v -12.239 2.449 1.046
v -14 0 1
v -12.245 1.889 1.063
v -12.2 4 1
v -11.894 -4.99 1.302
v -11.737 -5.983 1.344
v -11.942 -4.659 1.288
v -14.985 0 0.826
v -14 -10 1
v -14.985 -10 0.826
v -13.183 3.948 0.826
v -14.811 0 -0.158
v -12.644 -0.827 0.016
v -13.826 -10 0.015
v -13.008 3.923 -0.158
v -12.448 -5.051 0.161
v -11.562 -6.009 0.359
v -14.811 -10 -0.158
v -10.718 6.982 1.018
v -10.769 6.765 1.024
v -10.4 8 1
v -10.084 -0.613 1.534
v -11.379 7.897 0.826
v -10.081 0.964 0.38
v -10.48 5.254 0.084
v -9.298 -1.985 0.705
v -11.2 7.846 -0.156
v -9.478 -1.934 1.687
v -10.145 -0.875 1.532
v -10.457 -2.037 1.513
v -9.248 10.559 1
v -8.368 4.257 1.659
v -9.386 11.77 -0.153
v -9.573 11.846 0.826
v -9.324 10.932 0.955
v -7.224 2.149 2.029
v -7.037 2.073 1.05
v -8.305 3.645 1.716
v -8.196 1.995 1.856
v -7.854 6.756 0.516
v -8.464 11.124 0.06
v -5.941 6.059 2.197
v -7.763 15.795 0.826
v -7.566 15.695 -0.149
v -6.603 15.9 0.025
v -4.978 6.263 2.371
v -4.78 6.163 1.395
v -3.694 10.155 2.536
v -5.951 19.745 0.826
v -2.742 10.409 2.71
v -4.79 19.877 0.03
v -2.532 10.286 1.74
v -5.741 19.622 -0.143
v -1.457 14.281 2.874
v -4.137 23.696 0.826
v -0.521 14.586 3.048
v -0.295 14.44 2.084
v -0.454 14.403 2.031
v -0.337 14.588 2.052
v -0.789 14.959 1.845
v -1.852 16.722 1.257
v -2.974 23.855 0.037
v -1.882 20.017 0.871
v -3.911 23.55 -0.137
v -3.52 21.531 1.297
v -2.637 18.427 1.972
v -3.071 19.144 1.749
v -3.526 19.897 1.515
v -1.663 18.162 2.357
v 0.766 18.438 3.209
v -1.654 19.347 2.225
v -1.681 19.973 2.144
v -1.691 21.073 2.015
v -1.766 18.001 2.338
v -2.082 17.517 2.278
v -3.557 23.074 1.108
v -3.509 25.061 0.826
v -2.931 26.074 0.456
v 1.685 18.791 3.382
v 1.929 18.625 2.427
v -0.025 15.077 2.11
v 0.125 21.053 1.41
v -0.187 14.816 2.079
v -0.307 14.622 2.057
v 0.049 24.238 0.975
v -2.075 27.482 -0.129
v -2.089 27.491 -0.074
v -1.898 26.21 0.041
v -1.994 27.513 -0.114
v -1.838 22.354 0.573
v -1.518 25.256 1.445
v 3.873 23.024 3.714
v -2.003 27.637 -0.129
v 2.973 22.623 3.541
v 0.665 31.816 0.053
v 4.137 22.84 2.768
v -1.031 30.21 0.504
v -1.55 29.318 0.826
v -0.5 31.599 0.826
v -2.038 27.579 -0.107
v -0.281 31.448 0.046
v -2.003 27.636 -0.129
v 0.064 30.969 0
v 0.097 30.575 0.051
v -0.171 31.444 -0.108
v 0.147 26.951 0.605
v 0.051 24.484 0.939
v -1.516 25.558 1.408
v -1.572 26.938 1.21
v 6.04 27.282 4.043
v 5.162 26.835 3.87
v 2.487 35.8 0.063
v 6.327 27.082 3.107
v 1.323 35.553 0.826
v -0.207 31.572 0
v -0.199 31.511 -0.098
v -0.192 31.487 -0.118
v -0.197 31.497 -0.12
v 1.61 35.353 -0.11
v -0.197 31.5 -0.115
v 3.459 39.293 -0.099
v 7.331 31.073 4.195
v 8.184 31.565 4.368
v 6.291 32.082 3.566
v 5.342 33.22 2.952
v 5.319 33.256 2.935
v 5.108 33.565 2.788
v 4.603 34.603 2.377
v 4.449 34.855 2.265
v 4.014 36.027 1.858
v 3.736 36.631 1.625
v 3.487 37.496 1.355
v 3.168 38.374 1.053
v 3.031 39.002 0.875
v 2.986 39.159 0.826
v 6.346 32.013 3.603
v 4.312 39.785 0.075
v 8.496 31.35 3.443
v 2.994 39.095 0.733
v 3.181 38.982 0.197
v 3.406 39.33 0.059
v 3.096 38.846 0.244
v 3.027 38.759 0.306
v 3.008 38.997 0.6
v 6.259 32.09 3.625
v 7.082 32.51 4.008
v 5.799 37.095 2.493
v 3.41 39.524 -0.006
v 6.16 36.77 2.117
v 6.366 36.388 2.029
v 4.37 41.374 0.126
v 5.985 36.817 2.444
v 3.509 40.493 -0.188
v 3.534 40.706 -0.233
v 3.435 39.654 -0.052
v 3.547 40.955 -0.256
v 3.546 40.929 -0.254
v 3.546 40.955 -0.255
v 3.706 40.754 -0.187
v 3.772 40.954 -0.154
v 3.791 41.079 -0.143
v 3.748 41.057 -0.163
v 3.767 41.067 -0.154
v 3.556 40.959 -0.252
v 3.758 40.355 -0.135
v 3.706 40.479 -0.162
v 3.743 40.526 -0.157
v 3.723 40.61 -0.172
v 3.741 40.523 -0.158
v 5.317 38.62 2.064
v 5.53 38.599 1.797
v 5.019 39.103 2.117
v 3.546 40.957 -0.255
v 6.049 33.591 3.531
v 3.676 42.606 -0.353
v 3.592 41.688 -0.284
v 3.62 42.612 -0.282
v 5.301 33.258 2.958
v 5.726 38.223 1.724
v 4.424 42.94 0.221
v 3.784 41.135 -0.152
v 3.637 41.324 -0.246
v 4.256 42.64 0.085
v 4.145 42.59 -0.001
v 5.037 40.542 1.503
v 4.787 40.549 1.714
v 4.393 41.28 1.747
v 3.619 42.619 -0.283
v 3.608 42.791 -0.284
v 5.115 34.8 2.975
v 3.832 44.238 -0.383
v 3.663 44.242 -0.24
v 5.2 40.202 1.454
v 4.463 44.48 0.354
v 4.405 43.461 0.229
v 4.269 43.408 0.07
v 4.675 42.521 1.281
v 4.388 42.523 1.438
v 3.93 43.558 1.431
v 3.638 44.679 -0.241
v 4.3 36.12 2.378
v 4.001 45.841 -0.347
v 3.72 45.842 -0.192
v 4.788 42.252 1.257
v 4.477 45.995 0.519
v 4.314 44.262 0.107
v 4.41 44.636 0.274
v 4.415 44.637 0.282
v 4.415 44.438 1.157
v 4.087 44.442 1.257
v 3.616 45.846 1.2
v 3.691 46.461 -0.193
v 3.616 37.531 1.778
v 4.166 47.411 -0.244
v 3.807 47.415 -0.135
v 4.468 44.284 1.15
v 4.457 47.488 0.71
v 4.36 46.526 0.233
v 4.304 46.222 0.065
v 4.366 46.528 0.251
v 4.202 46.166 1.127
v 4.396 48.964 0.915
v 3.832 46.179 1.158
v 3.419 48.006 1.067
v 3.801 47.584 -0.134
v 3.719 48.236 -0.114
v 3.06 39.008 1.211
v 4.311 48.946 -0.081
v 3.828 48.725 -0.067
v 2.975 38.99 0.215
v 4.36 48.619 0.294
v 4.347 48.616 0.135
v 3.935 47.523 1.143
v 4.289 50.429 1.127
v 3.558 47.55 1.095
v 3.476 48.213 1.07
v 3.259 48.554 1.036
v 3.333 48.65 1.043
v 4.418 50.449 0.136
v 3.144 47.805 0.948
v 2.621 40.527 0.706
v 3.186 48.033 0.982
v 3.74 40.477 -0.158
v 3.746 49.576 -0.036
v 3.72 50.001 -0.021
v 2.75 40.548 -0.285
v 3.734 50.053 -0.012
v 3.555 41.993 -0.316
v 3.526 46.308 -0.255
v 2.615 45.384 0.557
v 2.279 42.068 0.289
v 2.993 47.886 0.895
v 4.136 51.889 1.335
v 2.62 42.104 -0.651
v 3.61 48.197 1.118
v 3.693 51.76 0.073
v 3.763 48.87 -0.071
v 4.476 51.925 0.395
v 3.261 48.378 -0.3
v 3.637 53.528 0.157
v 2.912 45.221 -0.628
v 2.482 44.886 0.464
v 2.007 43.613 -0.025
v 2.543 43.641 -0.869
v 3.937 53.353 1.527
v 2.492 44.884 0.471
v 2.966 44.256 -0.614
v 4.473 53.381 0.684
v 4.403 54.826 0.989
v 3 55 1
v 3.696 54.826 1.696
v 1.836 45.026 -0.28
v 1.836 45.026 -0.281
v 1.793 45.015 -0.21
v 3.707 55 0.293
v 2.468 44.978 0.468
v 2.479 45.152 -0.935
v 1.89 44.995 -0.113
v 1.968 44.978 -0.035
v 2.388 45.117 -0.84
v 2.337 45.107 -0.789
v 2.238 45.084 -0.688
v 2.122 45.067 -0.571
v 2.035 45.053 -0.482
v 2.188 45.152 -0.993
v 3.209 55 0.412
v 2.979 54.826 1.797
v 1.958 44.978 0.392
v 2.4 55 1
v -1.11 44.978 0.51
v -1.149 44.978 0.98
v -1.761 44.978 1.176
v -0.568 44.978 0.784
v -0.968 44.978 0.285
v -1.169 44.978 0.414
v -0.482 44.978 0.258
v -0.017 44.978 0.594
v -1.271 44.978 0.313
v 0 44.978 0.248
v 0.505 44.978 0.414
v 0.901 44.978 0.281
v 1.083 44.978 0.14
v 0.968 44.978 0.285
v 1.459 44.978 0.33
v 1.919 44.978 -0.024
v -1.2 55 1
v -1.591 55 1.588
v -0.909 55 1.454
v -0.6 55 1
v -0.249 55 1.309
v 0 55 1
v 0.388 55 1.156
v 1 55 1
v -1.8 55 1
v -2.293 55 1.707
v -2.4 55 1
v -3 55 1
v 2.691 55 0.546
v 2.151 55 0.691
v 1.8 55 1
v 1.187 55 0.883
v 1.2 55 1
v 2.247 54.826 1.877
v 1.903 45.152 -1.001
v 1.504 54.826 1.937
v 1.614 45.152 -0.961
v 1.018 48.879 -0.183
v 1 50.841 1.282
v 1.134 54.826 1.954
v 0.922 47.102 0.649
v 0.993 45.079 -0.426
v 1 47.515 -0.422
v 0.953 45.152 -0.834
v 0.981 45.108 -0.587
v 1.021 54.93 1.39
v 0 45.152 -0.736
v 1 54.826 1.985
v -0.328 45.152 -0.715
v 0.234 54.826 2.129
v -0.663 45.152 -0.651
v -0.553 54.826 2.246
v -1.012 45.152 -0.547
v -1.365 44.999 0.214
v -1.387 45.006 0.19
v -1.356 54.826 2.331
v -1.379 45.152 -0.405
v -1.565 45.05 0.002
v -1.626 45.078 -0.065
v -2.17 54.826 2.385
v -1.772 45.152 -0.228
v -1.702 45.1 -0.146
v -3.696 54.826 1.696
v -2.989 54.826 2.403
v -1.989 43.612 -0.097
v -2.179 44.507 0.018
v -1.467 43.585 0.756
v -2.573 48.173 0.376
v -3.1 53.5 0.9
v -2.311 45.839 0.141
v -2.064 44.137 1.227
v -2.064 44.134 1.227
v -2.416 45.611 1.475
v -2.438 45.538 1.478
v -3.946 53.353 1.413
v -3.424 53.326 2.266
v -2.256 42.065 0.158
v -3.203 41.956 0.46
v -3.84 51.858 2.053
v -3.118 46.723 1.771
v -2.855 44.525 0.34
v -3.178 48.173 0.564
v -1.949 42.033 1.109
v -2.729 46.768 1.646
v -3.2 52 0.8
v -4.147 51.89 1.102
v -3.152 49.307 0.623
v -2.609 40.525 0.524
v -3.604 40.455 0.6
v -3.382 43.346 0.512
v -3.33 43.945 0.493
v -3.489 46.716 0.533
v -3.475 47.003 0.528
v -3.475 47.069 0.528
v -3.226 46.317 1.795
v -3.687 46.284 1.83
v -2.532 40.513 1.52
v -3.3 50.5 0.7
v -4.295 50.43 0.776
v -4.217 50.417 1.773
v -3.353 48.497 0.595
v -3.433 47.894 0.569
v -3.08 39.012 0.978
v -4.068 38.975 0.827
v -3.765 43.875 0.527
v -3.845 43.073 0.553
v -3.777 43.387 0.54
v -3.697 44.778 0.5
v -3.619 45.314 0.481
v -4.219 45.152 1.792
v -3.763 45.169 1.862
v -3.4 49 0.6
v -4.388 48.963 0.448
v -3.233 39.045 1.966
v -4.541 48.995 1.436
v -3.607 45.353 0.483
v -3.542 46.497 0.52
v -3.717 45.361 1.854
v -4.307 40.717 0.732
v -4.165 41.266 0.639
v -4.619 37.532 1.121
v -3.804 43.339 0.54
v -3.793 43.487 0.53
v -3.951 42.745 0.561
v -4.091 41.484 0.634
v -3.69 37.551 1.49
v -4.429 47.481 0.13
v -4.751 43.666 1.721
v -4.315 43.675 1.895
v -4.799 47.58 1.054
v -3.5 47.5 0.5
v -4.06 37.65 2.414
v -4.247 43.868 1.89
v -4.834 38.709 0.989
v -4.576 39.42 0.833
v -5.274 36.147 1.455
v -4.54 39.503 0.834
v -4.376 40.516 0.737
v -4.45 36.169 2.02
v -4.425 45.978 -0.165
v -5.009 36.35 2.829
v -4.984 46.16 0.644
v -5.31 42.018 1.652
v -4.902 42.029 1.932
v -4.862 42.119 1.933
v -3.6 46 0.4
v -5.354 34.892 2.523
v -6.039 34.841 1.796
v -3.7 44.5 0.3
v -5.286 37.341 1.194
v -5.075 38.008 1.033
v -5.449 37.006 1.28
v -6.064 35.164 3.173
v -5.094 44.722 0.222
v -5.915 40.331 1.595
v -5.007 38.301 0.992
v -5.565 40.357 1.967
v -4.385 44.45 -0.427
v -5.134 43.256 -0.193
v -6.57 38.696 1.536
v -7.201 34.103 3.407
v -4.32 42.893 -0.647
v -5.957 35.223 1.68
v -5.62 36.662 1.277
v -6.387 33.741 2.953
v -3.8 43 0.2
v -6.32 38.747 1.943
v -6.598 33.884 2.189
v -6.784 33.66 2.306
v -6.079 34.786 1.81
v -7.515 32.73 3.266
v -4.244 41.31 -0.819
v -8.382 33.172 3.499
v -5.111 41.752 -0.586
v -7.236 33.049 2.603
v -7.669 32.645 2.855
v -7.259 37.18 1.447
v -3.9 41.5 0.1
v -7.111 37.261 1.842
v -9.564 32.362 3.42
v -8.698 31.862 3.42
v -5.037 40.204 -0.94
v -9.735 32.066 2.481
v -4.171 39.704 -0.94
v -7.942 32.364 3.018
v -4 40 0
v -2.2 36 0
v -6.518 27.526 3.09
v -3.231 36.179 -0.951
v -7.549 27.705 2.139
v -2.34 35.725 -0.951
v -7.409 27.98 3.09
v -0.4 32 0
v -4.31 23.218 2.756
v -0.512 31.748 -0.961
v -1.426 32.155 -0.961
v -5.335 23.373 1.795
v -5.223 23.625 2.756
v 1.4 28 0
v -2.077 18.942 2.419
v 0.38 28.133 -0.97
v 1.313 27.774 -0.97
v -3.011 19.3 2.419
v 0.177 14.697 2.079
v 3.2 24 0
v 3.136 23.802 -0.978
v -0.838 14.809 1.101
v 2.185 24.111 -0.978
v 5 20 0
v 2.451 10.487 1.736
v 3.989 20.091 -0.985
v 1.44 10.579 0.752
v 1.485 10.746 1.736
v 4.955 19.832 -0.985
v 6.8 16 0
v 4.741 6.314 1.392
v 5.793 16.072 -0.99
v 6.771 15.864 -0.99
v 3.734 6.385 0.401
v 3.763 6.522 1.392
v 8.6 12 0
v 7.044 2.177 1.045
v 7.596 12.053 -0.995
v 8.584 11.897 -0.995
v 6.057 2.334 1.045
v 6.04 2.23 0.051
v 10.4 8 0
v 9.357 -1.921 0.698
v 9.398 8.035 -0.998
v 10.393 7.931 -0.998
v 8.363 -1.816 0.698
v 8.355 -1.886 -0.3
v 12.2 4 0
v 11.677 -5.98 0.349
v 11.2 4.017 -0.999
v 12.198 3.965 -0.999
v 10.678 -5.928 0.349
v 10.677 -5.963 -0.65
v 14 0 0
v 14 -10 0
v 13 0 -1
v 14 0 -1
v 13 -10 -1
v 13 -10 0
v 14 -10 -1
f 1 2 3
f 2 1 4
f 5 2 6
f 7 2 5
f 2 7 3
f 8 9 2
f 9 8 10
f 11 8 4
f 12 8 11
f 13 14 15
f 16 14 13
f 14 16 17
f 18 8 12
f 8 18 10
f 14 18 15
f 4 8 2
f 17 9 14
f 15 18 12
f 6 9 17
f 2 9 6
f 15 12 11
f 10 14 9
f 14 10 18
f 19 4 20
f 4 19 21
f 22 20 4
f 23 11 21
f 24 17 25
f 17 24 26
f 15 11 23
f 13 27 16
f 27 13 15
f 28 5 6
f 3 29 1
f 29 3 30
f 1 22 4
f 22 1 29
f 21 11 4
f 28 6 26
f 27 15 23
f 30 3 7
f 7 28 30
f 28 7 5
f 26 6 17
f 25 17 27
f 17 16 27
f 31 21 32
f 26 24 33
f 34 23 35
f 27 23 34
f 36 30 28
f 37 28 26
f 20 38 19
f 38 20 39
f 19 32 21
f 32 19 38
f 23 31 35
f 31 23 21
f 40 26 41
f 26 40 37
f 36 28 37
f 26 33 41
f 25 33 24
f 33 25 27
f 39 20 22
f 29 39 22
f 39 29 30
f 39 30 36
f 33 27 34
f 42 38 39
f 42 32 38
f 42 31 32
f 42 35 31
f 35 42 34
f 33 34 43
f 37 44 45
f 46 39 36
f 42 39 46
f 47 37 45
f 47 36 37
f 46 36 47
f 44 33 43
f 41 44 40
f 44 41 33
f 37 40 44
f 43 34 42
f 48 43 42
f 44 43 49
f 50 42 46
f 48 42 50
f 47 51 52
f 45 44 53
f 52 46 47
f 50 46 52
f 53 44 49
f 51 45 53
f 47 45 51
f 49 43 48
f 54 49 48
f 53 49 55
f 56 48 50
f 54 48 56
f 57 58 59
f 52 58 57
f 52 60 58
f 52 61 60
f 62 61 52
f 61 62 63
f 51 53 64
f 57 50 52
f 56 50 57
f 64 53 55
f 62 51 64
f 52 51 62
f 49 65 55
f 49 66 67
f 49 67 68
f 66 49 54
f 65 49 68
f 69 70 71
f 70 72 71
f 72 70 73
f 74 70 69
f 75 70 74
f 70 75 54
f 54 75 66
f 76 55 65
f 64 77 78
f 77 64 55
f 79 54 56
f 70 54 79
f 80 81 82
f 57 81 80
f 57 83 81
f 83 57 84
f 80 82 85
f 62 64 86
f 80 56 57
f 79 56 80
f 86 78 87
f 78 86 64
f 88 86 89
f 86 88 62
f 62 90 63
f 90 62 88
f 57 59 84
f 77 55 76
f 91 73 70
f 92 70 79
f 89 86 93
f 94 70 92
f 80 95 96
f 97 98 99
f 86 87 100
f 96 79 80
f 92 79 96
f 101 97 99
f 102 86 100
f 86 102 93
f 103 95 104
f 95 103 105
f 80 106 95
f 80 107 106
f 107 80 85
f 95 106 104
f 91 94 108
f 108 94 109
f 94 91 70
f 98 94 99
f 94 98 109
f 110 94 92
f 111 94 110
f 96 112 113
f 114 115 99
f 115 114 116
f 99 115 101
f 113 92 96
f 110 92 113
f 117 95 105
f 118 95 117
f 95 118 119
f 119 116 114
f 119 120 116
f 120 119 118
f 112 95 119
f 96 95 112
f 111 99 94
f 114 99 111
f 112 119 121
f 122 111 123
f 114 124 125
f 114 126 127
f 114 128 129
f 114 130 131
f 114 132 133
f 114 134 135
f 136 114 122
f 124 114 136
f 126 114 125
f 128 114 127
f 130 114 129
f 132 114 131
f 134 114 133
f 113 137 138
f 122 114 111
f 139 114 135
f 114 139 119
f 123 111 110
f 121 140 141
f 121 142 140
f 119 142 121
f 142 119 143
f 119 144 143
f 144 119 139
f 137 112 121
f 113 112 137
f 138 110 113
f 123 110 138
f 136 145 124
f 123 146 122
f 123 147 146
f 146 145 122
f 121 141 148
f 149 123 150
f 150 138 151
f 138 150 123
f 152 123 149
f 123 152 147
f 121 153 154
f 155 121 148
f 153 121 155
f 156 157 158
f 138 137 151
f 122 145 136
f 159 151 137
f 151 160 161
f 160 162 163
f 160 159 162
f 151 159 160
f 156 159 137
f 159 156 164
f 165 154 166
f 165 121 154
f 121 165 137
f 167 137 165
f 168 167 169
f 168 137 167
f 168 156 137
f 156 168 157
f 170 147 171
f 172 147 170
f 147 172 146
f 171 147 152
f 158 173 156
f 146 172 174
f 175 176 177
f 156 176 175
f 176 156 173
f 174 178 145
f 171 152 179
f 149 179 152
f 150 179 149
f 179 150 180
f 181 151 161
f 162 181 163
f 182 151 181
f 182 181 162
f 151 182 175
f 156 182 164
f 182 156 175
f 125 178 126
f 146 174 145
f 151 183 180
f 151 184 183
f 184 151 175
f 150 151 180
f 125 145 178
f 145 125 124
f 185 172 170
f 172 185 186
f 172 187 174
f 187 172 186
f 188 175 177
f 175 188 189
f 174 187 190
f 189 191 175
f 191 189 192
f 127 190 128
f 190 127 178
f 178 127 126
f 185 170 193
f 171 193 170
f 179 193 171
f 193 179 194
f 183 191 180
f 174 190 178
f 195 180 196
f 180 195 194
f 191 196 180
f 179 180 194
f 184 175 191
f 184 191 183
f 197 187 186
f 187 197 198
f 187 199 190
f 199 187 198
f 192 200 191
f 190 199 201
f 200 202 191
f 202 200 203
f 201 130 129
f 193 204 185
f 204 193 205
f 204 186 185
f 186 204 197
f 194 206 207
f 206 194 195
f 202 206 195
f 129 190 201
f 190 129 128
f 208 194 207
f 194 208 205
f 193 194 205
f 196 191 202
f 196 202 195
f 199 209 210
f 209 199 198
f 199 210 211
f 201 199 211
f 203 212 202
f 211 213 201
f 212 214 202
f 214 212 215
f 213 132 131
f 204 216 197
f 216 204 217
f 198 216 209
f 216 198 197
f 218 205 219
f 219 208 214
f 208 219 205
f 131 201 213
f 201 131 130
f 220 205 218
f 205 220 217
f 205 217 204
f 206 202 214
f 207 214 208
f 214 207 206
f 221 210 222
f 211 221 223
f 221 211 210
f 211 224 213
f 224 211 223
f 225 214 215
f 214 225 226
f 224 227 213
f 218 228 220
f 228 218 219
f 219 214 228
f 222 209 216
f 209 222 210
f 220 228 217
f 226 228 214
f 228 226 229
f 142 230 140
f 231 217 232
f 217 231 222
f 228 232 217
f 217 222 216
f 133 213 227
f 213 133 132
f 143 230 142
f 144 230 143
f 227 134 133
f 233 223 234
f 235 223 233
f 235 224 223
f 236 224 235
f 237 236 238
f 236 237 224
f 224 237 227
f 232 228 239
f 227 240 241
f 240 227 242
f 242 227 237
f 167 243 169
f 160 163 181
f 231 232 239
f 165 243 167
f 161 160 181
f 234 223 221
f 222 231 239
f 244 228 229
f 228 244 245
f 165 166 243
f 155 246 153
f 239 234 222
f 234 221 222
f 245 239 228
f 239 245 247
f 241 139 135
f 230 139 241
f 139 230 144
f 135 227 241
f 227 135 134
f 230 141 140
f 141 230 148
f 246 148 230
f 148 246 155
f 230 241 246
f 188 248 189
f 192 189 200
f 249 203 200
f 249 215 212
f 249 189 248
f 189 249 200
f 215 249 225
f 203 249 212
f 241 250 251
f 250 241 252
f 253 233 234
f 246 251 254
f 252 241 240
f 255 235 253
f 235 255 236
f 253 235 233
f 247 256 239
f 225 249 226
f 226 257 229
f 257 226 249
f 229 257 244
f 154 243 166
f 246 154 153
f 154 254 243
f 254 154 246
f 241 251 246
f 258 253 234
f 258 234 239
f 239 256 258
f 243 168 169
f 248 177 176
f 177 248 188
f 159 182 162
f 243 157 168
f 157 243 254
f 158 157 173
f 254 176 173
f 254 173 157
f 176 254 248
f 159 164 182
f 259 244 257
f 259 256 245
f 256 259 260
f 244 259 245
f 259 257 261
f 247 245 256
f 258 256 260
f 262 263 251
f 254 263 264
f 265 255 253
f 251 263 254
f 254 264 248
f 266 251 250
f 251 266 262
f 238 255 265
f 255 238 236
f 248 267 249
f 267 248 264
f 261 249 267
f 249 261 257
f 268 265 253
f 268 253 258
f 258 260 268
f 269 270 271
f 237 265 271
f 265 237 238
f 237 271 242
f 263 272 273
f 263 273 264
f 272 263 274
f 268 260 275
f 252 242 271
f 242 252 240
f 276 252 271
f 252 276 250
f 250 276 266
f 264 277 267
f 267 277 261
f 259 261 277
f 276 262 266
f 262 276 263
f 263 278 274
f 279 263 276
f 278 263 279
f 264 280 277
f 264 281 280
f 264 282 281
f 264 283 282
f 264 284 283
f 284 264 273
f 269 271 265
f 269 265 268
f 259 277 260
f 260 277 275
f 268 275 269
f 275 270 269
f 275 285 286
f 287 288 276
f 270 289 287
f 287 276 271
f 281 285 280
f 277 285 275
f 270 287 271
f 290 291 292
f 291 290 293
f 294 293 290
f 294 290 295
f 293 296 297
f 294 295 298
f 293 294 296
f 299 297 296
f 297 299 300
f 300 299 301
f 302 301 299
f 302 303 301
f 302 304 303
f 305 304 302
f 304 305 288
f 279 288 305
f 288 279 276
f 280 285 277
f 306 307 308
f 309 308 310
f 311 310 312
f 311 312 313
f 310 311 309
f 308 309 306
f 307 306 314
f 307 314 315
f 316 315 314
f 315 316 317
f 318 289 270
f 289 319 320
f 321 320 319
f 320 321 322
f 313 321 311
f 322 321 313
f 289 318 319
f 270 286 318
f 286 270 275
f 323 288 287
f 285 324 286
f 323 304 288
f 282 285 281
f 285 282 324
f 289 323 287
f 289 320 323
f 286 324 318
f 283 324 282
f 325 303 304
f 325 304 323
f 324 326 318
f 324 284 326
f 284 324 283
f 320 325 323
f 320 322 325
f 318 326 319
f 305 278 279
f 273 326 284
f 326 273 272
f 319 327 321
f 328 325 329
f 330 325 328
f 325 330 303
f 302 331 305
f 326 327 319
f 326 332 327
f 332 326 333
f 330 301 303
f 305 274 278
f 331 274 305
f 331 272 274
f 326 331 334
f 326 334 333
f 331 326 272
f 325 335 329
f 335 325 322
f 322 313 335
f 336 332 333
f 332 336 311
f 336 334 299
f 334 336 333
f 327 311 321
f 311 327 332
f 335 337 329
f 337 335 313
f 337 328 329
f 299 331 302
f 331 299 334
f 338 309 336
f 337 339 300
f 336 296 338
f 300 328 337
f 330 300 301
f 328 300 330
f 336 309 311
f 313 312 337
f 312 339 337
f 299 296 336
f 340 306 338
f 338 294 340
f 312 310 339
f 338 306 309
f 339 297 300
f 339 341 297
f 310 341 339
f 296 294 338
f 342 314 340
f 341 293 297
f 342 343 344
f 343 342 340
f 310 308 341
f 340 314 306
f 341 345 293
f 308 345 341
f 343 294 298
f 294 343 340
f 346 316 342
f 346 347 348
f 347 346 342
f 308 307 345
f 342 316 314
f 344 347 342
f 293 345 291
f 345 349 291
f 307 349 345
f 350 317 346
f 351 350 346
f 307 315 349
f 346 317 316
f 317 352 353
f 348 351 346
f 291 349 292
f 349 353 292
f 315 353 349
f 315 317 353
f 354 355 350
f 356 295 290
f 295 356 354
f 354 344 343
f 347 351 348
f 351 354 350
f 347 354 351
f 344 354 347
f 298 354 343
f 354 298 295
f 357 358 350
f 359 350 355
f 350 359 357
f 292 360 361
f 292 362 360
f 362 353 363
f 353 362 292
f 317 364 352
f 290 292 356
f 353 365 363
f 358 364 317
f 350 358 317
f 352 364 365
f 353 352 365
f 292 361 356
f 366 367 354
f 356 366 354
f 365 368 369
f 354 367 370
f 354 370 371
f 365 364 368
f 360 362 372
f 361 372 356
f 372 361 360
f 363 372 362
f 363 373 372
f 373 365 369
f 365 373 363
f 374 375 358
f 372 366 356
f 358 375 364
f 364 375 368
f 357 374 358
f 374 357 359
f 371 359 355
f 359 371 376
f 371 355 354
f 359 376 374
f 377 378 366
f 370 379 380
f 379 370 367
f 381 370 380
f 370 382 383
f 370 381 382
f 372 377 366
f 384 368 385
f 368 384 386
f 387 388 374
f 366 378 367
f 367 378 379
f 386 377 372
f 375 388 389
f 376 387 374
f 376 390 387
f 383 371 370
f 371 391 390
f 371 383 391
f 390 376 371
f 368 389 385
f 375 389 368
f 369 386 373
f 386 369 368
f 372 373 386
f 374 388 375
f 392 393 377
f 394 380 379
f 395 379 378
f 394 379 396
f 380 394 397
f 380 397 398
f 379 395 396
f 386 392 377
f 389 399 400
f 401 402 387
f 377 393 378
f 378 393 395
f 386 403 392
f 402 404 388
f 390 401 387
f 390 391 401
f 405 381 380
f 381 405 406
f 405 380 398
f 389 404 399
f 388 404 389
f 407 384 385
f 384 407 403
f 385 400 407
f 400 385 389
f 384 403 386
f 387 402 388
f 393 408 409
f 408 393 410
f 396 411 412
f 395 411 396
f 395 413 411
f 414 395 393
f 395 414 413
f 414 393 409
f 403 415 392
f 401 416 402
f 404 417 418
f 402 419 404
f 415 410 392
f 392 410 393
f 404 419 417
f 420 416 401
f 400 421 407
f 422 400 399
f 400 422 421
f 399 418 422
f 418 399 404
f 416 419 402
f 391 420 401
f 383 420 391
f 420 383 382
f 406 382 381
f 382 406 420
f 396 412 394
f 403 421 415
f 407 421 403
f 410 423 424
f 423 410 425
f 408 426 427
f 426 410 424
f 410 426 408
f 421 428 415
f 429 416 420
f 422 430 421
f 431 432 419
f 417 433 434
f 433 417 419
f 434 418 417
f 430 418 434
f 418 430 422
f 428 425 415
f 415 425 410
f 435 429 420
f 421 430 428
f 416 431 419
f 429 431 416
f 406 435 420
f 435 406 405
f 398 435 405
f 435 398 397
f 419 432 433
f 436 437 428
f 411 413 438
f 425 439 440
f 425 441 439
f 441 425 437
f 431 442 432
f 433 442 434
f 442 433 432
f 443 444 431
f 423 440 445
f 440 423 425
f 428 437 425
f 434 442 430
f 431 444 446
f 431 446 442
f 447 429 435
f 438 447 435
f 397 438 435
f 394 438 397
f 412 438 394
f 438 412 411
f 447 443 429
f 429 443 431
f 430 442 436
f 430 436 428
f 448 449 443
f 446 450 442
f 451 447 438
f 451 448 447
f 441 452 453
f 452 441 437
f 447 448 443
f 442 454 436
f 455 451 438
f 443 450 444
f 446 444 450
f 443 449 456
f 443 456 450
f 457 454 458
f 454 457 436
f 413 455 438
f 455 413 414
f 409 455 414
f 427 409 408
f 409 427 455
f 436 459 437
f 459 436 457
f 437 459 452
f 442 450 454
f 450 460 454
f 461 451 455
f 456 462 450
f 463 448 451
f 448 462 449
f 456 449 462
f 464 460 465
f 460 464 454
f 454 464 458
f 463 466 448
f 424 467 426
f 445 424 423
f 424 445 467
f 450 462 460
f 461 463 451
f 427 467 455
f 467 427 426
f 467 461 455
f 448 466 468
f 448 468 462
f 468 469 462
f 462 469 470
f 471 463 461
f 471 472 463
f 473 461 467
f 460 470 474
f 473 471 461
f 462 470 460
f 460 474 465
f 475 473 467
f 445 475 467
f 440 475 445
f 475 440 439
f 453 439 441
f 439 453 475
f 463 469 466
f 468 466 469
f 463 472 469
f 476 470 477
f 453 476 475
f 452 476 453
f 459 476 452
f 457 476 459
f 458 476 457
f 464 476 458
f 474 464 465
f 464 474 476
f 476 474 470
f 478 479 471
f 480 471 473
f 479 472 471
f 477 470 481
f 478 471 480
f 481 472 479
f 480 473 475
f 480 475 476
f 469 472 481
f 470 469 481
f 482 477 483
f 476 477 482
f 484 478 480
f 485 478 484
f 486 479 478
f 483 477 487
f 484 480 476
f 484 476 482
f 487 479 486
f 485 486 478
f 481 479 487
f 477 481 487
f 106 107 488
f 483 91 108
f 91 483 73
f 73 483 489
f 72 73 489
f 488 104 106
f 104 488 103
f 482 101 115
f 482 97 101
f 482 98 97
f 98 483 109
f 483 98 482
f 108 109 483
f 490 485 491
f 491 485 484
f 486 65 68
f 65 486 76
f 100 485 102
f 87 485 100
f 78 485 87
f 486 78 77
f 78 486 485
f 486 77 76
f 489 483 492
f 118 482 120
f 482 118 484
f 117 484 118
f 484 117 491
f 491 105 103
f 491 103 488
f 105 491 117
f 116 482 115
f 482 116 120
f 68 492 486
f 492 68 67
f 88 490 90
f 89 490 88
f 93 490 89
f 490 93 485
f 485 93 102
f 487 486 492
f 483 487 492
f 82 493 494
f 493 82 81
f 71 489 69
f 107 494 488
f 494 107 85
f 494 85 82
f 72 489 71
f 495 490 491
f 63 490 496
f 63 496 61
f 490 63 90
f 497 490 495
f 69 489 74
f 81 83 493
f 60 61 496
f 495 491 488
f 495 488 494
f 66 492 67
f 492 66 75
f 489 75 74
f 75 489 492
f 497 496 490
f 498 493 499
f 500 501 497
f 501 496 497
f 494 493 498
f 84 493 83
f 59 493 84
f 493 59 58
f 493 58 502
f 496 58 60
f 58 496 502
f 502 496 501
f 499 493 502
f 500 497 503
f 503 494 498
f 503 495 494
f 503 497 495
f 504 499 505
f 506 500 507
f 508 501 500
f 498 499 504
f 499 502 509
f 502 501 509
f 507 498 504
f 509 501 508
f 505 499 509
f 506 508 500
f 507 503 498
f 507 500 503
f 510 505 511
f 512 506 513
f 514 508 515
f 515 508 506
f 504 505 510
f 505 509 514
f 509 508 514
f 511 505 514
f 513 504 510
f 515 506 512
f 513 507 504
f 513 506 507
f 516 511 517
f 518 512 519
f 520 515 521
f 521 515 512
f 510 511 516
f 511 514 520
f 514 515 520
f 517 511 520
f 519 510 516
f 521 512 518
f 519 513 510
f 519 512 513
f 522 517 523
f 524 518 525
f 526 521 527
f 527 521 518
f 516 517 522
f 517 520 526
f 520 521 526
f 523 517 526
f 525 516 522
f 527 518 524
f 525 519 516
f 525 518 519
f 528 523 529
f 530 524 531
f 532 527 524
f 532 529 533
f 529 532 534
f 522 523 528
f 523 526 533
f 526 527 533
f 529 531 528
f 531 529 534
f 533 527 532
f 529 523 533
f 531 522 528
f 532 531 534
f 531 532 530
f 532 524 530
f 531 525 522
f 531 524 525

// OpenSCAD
v=[
[[-14,0,1] ,[0,350,0]],
[[4,40,1] ,[-20,350,30]],
 [[3,55,1]   ,[-10,180+45,0]], 
 
  [[-3,55,1]  ,[-10,180-45,0]],  
 [[-4,40,0]  ,[-20, 0,-30]],
 [[14,0,0]  ,[0, 0,0]],
];


for(i=[1:len(v)-1]){
for(j=[0.1:0.1:1])
{
T1=lerp(v[i-1],v[i],j);
T2=lerp(v[i-1],v[i],j-0.1);
hull(){
translate(T1[0])rotate(T1[1])translate([ 0,0,-1])rotate([0,0,90])translate([ -10,0,-0])cube([10,1,1]  );
translate(T2[0])rotate(T2[1])translate([ 0,0,-1])rotate([0,0,90])translate([ -10,0,-0])cube([10,1,1] );
}}}
function lerp(start,end,bias ) = (end * bias + start * (1 - bias));
